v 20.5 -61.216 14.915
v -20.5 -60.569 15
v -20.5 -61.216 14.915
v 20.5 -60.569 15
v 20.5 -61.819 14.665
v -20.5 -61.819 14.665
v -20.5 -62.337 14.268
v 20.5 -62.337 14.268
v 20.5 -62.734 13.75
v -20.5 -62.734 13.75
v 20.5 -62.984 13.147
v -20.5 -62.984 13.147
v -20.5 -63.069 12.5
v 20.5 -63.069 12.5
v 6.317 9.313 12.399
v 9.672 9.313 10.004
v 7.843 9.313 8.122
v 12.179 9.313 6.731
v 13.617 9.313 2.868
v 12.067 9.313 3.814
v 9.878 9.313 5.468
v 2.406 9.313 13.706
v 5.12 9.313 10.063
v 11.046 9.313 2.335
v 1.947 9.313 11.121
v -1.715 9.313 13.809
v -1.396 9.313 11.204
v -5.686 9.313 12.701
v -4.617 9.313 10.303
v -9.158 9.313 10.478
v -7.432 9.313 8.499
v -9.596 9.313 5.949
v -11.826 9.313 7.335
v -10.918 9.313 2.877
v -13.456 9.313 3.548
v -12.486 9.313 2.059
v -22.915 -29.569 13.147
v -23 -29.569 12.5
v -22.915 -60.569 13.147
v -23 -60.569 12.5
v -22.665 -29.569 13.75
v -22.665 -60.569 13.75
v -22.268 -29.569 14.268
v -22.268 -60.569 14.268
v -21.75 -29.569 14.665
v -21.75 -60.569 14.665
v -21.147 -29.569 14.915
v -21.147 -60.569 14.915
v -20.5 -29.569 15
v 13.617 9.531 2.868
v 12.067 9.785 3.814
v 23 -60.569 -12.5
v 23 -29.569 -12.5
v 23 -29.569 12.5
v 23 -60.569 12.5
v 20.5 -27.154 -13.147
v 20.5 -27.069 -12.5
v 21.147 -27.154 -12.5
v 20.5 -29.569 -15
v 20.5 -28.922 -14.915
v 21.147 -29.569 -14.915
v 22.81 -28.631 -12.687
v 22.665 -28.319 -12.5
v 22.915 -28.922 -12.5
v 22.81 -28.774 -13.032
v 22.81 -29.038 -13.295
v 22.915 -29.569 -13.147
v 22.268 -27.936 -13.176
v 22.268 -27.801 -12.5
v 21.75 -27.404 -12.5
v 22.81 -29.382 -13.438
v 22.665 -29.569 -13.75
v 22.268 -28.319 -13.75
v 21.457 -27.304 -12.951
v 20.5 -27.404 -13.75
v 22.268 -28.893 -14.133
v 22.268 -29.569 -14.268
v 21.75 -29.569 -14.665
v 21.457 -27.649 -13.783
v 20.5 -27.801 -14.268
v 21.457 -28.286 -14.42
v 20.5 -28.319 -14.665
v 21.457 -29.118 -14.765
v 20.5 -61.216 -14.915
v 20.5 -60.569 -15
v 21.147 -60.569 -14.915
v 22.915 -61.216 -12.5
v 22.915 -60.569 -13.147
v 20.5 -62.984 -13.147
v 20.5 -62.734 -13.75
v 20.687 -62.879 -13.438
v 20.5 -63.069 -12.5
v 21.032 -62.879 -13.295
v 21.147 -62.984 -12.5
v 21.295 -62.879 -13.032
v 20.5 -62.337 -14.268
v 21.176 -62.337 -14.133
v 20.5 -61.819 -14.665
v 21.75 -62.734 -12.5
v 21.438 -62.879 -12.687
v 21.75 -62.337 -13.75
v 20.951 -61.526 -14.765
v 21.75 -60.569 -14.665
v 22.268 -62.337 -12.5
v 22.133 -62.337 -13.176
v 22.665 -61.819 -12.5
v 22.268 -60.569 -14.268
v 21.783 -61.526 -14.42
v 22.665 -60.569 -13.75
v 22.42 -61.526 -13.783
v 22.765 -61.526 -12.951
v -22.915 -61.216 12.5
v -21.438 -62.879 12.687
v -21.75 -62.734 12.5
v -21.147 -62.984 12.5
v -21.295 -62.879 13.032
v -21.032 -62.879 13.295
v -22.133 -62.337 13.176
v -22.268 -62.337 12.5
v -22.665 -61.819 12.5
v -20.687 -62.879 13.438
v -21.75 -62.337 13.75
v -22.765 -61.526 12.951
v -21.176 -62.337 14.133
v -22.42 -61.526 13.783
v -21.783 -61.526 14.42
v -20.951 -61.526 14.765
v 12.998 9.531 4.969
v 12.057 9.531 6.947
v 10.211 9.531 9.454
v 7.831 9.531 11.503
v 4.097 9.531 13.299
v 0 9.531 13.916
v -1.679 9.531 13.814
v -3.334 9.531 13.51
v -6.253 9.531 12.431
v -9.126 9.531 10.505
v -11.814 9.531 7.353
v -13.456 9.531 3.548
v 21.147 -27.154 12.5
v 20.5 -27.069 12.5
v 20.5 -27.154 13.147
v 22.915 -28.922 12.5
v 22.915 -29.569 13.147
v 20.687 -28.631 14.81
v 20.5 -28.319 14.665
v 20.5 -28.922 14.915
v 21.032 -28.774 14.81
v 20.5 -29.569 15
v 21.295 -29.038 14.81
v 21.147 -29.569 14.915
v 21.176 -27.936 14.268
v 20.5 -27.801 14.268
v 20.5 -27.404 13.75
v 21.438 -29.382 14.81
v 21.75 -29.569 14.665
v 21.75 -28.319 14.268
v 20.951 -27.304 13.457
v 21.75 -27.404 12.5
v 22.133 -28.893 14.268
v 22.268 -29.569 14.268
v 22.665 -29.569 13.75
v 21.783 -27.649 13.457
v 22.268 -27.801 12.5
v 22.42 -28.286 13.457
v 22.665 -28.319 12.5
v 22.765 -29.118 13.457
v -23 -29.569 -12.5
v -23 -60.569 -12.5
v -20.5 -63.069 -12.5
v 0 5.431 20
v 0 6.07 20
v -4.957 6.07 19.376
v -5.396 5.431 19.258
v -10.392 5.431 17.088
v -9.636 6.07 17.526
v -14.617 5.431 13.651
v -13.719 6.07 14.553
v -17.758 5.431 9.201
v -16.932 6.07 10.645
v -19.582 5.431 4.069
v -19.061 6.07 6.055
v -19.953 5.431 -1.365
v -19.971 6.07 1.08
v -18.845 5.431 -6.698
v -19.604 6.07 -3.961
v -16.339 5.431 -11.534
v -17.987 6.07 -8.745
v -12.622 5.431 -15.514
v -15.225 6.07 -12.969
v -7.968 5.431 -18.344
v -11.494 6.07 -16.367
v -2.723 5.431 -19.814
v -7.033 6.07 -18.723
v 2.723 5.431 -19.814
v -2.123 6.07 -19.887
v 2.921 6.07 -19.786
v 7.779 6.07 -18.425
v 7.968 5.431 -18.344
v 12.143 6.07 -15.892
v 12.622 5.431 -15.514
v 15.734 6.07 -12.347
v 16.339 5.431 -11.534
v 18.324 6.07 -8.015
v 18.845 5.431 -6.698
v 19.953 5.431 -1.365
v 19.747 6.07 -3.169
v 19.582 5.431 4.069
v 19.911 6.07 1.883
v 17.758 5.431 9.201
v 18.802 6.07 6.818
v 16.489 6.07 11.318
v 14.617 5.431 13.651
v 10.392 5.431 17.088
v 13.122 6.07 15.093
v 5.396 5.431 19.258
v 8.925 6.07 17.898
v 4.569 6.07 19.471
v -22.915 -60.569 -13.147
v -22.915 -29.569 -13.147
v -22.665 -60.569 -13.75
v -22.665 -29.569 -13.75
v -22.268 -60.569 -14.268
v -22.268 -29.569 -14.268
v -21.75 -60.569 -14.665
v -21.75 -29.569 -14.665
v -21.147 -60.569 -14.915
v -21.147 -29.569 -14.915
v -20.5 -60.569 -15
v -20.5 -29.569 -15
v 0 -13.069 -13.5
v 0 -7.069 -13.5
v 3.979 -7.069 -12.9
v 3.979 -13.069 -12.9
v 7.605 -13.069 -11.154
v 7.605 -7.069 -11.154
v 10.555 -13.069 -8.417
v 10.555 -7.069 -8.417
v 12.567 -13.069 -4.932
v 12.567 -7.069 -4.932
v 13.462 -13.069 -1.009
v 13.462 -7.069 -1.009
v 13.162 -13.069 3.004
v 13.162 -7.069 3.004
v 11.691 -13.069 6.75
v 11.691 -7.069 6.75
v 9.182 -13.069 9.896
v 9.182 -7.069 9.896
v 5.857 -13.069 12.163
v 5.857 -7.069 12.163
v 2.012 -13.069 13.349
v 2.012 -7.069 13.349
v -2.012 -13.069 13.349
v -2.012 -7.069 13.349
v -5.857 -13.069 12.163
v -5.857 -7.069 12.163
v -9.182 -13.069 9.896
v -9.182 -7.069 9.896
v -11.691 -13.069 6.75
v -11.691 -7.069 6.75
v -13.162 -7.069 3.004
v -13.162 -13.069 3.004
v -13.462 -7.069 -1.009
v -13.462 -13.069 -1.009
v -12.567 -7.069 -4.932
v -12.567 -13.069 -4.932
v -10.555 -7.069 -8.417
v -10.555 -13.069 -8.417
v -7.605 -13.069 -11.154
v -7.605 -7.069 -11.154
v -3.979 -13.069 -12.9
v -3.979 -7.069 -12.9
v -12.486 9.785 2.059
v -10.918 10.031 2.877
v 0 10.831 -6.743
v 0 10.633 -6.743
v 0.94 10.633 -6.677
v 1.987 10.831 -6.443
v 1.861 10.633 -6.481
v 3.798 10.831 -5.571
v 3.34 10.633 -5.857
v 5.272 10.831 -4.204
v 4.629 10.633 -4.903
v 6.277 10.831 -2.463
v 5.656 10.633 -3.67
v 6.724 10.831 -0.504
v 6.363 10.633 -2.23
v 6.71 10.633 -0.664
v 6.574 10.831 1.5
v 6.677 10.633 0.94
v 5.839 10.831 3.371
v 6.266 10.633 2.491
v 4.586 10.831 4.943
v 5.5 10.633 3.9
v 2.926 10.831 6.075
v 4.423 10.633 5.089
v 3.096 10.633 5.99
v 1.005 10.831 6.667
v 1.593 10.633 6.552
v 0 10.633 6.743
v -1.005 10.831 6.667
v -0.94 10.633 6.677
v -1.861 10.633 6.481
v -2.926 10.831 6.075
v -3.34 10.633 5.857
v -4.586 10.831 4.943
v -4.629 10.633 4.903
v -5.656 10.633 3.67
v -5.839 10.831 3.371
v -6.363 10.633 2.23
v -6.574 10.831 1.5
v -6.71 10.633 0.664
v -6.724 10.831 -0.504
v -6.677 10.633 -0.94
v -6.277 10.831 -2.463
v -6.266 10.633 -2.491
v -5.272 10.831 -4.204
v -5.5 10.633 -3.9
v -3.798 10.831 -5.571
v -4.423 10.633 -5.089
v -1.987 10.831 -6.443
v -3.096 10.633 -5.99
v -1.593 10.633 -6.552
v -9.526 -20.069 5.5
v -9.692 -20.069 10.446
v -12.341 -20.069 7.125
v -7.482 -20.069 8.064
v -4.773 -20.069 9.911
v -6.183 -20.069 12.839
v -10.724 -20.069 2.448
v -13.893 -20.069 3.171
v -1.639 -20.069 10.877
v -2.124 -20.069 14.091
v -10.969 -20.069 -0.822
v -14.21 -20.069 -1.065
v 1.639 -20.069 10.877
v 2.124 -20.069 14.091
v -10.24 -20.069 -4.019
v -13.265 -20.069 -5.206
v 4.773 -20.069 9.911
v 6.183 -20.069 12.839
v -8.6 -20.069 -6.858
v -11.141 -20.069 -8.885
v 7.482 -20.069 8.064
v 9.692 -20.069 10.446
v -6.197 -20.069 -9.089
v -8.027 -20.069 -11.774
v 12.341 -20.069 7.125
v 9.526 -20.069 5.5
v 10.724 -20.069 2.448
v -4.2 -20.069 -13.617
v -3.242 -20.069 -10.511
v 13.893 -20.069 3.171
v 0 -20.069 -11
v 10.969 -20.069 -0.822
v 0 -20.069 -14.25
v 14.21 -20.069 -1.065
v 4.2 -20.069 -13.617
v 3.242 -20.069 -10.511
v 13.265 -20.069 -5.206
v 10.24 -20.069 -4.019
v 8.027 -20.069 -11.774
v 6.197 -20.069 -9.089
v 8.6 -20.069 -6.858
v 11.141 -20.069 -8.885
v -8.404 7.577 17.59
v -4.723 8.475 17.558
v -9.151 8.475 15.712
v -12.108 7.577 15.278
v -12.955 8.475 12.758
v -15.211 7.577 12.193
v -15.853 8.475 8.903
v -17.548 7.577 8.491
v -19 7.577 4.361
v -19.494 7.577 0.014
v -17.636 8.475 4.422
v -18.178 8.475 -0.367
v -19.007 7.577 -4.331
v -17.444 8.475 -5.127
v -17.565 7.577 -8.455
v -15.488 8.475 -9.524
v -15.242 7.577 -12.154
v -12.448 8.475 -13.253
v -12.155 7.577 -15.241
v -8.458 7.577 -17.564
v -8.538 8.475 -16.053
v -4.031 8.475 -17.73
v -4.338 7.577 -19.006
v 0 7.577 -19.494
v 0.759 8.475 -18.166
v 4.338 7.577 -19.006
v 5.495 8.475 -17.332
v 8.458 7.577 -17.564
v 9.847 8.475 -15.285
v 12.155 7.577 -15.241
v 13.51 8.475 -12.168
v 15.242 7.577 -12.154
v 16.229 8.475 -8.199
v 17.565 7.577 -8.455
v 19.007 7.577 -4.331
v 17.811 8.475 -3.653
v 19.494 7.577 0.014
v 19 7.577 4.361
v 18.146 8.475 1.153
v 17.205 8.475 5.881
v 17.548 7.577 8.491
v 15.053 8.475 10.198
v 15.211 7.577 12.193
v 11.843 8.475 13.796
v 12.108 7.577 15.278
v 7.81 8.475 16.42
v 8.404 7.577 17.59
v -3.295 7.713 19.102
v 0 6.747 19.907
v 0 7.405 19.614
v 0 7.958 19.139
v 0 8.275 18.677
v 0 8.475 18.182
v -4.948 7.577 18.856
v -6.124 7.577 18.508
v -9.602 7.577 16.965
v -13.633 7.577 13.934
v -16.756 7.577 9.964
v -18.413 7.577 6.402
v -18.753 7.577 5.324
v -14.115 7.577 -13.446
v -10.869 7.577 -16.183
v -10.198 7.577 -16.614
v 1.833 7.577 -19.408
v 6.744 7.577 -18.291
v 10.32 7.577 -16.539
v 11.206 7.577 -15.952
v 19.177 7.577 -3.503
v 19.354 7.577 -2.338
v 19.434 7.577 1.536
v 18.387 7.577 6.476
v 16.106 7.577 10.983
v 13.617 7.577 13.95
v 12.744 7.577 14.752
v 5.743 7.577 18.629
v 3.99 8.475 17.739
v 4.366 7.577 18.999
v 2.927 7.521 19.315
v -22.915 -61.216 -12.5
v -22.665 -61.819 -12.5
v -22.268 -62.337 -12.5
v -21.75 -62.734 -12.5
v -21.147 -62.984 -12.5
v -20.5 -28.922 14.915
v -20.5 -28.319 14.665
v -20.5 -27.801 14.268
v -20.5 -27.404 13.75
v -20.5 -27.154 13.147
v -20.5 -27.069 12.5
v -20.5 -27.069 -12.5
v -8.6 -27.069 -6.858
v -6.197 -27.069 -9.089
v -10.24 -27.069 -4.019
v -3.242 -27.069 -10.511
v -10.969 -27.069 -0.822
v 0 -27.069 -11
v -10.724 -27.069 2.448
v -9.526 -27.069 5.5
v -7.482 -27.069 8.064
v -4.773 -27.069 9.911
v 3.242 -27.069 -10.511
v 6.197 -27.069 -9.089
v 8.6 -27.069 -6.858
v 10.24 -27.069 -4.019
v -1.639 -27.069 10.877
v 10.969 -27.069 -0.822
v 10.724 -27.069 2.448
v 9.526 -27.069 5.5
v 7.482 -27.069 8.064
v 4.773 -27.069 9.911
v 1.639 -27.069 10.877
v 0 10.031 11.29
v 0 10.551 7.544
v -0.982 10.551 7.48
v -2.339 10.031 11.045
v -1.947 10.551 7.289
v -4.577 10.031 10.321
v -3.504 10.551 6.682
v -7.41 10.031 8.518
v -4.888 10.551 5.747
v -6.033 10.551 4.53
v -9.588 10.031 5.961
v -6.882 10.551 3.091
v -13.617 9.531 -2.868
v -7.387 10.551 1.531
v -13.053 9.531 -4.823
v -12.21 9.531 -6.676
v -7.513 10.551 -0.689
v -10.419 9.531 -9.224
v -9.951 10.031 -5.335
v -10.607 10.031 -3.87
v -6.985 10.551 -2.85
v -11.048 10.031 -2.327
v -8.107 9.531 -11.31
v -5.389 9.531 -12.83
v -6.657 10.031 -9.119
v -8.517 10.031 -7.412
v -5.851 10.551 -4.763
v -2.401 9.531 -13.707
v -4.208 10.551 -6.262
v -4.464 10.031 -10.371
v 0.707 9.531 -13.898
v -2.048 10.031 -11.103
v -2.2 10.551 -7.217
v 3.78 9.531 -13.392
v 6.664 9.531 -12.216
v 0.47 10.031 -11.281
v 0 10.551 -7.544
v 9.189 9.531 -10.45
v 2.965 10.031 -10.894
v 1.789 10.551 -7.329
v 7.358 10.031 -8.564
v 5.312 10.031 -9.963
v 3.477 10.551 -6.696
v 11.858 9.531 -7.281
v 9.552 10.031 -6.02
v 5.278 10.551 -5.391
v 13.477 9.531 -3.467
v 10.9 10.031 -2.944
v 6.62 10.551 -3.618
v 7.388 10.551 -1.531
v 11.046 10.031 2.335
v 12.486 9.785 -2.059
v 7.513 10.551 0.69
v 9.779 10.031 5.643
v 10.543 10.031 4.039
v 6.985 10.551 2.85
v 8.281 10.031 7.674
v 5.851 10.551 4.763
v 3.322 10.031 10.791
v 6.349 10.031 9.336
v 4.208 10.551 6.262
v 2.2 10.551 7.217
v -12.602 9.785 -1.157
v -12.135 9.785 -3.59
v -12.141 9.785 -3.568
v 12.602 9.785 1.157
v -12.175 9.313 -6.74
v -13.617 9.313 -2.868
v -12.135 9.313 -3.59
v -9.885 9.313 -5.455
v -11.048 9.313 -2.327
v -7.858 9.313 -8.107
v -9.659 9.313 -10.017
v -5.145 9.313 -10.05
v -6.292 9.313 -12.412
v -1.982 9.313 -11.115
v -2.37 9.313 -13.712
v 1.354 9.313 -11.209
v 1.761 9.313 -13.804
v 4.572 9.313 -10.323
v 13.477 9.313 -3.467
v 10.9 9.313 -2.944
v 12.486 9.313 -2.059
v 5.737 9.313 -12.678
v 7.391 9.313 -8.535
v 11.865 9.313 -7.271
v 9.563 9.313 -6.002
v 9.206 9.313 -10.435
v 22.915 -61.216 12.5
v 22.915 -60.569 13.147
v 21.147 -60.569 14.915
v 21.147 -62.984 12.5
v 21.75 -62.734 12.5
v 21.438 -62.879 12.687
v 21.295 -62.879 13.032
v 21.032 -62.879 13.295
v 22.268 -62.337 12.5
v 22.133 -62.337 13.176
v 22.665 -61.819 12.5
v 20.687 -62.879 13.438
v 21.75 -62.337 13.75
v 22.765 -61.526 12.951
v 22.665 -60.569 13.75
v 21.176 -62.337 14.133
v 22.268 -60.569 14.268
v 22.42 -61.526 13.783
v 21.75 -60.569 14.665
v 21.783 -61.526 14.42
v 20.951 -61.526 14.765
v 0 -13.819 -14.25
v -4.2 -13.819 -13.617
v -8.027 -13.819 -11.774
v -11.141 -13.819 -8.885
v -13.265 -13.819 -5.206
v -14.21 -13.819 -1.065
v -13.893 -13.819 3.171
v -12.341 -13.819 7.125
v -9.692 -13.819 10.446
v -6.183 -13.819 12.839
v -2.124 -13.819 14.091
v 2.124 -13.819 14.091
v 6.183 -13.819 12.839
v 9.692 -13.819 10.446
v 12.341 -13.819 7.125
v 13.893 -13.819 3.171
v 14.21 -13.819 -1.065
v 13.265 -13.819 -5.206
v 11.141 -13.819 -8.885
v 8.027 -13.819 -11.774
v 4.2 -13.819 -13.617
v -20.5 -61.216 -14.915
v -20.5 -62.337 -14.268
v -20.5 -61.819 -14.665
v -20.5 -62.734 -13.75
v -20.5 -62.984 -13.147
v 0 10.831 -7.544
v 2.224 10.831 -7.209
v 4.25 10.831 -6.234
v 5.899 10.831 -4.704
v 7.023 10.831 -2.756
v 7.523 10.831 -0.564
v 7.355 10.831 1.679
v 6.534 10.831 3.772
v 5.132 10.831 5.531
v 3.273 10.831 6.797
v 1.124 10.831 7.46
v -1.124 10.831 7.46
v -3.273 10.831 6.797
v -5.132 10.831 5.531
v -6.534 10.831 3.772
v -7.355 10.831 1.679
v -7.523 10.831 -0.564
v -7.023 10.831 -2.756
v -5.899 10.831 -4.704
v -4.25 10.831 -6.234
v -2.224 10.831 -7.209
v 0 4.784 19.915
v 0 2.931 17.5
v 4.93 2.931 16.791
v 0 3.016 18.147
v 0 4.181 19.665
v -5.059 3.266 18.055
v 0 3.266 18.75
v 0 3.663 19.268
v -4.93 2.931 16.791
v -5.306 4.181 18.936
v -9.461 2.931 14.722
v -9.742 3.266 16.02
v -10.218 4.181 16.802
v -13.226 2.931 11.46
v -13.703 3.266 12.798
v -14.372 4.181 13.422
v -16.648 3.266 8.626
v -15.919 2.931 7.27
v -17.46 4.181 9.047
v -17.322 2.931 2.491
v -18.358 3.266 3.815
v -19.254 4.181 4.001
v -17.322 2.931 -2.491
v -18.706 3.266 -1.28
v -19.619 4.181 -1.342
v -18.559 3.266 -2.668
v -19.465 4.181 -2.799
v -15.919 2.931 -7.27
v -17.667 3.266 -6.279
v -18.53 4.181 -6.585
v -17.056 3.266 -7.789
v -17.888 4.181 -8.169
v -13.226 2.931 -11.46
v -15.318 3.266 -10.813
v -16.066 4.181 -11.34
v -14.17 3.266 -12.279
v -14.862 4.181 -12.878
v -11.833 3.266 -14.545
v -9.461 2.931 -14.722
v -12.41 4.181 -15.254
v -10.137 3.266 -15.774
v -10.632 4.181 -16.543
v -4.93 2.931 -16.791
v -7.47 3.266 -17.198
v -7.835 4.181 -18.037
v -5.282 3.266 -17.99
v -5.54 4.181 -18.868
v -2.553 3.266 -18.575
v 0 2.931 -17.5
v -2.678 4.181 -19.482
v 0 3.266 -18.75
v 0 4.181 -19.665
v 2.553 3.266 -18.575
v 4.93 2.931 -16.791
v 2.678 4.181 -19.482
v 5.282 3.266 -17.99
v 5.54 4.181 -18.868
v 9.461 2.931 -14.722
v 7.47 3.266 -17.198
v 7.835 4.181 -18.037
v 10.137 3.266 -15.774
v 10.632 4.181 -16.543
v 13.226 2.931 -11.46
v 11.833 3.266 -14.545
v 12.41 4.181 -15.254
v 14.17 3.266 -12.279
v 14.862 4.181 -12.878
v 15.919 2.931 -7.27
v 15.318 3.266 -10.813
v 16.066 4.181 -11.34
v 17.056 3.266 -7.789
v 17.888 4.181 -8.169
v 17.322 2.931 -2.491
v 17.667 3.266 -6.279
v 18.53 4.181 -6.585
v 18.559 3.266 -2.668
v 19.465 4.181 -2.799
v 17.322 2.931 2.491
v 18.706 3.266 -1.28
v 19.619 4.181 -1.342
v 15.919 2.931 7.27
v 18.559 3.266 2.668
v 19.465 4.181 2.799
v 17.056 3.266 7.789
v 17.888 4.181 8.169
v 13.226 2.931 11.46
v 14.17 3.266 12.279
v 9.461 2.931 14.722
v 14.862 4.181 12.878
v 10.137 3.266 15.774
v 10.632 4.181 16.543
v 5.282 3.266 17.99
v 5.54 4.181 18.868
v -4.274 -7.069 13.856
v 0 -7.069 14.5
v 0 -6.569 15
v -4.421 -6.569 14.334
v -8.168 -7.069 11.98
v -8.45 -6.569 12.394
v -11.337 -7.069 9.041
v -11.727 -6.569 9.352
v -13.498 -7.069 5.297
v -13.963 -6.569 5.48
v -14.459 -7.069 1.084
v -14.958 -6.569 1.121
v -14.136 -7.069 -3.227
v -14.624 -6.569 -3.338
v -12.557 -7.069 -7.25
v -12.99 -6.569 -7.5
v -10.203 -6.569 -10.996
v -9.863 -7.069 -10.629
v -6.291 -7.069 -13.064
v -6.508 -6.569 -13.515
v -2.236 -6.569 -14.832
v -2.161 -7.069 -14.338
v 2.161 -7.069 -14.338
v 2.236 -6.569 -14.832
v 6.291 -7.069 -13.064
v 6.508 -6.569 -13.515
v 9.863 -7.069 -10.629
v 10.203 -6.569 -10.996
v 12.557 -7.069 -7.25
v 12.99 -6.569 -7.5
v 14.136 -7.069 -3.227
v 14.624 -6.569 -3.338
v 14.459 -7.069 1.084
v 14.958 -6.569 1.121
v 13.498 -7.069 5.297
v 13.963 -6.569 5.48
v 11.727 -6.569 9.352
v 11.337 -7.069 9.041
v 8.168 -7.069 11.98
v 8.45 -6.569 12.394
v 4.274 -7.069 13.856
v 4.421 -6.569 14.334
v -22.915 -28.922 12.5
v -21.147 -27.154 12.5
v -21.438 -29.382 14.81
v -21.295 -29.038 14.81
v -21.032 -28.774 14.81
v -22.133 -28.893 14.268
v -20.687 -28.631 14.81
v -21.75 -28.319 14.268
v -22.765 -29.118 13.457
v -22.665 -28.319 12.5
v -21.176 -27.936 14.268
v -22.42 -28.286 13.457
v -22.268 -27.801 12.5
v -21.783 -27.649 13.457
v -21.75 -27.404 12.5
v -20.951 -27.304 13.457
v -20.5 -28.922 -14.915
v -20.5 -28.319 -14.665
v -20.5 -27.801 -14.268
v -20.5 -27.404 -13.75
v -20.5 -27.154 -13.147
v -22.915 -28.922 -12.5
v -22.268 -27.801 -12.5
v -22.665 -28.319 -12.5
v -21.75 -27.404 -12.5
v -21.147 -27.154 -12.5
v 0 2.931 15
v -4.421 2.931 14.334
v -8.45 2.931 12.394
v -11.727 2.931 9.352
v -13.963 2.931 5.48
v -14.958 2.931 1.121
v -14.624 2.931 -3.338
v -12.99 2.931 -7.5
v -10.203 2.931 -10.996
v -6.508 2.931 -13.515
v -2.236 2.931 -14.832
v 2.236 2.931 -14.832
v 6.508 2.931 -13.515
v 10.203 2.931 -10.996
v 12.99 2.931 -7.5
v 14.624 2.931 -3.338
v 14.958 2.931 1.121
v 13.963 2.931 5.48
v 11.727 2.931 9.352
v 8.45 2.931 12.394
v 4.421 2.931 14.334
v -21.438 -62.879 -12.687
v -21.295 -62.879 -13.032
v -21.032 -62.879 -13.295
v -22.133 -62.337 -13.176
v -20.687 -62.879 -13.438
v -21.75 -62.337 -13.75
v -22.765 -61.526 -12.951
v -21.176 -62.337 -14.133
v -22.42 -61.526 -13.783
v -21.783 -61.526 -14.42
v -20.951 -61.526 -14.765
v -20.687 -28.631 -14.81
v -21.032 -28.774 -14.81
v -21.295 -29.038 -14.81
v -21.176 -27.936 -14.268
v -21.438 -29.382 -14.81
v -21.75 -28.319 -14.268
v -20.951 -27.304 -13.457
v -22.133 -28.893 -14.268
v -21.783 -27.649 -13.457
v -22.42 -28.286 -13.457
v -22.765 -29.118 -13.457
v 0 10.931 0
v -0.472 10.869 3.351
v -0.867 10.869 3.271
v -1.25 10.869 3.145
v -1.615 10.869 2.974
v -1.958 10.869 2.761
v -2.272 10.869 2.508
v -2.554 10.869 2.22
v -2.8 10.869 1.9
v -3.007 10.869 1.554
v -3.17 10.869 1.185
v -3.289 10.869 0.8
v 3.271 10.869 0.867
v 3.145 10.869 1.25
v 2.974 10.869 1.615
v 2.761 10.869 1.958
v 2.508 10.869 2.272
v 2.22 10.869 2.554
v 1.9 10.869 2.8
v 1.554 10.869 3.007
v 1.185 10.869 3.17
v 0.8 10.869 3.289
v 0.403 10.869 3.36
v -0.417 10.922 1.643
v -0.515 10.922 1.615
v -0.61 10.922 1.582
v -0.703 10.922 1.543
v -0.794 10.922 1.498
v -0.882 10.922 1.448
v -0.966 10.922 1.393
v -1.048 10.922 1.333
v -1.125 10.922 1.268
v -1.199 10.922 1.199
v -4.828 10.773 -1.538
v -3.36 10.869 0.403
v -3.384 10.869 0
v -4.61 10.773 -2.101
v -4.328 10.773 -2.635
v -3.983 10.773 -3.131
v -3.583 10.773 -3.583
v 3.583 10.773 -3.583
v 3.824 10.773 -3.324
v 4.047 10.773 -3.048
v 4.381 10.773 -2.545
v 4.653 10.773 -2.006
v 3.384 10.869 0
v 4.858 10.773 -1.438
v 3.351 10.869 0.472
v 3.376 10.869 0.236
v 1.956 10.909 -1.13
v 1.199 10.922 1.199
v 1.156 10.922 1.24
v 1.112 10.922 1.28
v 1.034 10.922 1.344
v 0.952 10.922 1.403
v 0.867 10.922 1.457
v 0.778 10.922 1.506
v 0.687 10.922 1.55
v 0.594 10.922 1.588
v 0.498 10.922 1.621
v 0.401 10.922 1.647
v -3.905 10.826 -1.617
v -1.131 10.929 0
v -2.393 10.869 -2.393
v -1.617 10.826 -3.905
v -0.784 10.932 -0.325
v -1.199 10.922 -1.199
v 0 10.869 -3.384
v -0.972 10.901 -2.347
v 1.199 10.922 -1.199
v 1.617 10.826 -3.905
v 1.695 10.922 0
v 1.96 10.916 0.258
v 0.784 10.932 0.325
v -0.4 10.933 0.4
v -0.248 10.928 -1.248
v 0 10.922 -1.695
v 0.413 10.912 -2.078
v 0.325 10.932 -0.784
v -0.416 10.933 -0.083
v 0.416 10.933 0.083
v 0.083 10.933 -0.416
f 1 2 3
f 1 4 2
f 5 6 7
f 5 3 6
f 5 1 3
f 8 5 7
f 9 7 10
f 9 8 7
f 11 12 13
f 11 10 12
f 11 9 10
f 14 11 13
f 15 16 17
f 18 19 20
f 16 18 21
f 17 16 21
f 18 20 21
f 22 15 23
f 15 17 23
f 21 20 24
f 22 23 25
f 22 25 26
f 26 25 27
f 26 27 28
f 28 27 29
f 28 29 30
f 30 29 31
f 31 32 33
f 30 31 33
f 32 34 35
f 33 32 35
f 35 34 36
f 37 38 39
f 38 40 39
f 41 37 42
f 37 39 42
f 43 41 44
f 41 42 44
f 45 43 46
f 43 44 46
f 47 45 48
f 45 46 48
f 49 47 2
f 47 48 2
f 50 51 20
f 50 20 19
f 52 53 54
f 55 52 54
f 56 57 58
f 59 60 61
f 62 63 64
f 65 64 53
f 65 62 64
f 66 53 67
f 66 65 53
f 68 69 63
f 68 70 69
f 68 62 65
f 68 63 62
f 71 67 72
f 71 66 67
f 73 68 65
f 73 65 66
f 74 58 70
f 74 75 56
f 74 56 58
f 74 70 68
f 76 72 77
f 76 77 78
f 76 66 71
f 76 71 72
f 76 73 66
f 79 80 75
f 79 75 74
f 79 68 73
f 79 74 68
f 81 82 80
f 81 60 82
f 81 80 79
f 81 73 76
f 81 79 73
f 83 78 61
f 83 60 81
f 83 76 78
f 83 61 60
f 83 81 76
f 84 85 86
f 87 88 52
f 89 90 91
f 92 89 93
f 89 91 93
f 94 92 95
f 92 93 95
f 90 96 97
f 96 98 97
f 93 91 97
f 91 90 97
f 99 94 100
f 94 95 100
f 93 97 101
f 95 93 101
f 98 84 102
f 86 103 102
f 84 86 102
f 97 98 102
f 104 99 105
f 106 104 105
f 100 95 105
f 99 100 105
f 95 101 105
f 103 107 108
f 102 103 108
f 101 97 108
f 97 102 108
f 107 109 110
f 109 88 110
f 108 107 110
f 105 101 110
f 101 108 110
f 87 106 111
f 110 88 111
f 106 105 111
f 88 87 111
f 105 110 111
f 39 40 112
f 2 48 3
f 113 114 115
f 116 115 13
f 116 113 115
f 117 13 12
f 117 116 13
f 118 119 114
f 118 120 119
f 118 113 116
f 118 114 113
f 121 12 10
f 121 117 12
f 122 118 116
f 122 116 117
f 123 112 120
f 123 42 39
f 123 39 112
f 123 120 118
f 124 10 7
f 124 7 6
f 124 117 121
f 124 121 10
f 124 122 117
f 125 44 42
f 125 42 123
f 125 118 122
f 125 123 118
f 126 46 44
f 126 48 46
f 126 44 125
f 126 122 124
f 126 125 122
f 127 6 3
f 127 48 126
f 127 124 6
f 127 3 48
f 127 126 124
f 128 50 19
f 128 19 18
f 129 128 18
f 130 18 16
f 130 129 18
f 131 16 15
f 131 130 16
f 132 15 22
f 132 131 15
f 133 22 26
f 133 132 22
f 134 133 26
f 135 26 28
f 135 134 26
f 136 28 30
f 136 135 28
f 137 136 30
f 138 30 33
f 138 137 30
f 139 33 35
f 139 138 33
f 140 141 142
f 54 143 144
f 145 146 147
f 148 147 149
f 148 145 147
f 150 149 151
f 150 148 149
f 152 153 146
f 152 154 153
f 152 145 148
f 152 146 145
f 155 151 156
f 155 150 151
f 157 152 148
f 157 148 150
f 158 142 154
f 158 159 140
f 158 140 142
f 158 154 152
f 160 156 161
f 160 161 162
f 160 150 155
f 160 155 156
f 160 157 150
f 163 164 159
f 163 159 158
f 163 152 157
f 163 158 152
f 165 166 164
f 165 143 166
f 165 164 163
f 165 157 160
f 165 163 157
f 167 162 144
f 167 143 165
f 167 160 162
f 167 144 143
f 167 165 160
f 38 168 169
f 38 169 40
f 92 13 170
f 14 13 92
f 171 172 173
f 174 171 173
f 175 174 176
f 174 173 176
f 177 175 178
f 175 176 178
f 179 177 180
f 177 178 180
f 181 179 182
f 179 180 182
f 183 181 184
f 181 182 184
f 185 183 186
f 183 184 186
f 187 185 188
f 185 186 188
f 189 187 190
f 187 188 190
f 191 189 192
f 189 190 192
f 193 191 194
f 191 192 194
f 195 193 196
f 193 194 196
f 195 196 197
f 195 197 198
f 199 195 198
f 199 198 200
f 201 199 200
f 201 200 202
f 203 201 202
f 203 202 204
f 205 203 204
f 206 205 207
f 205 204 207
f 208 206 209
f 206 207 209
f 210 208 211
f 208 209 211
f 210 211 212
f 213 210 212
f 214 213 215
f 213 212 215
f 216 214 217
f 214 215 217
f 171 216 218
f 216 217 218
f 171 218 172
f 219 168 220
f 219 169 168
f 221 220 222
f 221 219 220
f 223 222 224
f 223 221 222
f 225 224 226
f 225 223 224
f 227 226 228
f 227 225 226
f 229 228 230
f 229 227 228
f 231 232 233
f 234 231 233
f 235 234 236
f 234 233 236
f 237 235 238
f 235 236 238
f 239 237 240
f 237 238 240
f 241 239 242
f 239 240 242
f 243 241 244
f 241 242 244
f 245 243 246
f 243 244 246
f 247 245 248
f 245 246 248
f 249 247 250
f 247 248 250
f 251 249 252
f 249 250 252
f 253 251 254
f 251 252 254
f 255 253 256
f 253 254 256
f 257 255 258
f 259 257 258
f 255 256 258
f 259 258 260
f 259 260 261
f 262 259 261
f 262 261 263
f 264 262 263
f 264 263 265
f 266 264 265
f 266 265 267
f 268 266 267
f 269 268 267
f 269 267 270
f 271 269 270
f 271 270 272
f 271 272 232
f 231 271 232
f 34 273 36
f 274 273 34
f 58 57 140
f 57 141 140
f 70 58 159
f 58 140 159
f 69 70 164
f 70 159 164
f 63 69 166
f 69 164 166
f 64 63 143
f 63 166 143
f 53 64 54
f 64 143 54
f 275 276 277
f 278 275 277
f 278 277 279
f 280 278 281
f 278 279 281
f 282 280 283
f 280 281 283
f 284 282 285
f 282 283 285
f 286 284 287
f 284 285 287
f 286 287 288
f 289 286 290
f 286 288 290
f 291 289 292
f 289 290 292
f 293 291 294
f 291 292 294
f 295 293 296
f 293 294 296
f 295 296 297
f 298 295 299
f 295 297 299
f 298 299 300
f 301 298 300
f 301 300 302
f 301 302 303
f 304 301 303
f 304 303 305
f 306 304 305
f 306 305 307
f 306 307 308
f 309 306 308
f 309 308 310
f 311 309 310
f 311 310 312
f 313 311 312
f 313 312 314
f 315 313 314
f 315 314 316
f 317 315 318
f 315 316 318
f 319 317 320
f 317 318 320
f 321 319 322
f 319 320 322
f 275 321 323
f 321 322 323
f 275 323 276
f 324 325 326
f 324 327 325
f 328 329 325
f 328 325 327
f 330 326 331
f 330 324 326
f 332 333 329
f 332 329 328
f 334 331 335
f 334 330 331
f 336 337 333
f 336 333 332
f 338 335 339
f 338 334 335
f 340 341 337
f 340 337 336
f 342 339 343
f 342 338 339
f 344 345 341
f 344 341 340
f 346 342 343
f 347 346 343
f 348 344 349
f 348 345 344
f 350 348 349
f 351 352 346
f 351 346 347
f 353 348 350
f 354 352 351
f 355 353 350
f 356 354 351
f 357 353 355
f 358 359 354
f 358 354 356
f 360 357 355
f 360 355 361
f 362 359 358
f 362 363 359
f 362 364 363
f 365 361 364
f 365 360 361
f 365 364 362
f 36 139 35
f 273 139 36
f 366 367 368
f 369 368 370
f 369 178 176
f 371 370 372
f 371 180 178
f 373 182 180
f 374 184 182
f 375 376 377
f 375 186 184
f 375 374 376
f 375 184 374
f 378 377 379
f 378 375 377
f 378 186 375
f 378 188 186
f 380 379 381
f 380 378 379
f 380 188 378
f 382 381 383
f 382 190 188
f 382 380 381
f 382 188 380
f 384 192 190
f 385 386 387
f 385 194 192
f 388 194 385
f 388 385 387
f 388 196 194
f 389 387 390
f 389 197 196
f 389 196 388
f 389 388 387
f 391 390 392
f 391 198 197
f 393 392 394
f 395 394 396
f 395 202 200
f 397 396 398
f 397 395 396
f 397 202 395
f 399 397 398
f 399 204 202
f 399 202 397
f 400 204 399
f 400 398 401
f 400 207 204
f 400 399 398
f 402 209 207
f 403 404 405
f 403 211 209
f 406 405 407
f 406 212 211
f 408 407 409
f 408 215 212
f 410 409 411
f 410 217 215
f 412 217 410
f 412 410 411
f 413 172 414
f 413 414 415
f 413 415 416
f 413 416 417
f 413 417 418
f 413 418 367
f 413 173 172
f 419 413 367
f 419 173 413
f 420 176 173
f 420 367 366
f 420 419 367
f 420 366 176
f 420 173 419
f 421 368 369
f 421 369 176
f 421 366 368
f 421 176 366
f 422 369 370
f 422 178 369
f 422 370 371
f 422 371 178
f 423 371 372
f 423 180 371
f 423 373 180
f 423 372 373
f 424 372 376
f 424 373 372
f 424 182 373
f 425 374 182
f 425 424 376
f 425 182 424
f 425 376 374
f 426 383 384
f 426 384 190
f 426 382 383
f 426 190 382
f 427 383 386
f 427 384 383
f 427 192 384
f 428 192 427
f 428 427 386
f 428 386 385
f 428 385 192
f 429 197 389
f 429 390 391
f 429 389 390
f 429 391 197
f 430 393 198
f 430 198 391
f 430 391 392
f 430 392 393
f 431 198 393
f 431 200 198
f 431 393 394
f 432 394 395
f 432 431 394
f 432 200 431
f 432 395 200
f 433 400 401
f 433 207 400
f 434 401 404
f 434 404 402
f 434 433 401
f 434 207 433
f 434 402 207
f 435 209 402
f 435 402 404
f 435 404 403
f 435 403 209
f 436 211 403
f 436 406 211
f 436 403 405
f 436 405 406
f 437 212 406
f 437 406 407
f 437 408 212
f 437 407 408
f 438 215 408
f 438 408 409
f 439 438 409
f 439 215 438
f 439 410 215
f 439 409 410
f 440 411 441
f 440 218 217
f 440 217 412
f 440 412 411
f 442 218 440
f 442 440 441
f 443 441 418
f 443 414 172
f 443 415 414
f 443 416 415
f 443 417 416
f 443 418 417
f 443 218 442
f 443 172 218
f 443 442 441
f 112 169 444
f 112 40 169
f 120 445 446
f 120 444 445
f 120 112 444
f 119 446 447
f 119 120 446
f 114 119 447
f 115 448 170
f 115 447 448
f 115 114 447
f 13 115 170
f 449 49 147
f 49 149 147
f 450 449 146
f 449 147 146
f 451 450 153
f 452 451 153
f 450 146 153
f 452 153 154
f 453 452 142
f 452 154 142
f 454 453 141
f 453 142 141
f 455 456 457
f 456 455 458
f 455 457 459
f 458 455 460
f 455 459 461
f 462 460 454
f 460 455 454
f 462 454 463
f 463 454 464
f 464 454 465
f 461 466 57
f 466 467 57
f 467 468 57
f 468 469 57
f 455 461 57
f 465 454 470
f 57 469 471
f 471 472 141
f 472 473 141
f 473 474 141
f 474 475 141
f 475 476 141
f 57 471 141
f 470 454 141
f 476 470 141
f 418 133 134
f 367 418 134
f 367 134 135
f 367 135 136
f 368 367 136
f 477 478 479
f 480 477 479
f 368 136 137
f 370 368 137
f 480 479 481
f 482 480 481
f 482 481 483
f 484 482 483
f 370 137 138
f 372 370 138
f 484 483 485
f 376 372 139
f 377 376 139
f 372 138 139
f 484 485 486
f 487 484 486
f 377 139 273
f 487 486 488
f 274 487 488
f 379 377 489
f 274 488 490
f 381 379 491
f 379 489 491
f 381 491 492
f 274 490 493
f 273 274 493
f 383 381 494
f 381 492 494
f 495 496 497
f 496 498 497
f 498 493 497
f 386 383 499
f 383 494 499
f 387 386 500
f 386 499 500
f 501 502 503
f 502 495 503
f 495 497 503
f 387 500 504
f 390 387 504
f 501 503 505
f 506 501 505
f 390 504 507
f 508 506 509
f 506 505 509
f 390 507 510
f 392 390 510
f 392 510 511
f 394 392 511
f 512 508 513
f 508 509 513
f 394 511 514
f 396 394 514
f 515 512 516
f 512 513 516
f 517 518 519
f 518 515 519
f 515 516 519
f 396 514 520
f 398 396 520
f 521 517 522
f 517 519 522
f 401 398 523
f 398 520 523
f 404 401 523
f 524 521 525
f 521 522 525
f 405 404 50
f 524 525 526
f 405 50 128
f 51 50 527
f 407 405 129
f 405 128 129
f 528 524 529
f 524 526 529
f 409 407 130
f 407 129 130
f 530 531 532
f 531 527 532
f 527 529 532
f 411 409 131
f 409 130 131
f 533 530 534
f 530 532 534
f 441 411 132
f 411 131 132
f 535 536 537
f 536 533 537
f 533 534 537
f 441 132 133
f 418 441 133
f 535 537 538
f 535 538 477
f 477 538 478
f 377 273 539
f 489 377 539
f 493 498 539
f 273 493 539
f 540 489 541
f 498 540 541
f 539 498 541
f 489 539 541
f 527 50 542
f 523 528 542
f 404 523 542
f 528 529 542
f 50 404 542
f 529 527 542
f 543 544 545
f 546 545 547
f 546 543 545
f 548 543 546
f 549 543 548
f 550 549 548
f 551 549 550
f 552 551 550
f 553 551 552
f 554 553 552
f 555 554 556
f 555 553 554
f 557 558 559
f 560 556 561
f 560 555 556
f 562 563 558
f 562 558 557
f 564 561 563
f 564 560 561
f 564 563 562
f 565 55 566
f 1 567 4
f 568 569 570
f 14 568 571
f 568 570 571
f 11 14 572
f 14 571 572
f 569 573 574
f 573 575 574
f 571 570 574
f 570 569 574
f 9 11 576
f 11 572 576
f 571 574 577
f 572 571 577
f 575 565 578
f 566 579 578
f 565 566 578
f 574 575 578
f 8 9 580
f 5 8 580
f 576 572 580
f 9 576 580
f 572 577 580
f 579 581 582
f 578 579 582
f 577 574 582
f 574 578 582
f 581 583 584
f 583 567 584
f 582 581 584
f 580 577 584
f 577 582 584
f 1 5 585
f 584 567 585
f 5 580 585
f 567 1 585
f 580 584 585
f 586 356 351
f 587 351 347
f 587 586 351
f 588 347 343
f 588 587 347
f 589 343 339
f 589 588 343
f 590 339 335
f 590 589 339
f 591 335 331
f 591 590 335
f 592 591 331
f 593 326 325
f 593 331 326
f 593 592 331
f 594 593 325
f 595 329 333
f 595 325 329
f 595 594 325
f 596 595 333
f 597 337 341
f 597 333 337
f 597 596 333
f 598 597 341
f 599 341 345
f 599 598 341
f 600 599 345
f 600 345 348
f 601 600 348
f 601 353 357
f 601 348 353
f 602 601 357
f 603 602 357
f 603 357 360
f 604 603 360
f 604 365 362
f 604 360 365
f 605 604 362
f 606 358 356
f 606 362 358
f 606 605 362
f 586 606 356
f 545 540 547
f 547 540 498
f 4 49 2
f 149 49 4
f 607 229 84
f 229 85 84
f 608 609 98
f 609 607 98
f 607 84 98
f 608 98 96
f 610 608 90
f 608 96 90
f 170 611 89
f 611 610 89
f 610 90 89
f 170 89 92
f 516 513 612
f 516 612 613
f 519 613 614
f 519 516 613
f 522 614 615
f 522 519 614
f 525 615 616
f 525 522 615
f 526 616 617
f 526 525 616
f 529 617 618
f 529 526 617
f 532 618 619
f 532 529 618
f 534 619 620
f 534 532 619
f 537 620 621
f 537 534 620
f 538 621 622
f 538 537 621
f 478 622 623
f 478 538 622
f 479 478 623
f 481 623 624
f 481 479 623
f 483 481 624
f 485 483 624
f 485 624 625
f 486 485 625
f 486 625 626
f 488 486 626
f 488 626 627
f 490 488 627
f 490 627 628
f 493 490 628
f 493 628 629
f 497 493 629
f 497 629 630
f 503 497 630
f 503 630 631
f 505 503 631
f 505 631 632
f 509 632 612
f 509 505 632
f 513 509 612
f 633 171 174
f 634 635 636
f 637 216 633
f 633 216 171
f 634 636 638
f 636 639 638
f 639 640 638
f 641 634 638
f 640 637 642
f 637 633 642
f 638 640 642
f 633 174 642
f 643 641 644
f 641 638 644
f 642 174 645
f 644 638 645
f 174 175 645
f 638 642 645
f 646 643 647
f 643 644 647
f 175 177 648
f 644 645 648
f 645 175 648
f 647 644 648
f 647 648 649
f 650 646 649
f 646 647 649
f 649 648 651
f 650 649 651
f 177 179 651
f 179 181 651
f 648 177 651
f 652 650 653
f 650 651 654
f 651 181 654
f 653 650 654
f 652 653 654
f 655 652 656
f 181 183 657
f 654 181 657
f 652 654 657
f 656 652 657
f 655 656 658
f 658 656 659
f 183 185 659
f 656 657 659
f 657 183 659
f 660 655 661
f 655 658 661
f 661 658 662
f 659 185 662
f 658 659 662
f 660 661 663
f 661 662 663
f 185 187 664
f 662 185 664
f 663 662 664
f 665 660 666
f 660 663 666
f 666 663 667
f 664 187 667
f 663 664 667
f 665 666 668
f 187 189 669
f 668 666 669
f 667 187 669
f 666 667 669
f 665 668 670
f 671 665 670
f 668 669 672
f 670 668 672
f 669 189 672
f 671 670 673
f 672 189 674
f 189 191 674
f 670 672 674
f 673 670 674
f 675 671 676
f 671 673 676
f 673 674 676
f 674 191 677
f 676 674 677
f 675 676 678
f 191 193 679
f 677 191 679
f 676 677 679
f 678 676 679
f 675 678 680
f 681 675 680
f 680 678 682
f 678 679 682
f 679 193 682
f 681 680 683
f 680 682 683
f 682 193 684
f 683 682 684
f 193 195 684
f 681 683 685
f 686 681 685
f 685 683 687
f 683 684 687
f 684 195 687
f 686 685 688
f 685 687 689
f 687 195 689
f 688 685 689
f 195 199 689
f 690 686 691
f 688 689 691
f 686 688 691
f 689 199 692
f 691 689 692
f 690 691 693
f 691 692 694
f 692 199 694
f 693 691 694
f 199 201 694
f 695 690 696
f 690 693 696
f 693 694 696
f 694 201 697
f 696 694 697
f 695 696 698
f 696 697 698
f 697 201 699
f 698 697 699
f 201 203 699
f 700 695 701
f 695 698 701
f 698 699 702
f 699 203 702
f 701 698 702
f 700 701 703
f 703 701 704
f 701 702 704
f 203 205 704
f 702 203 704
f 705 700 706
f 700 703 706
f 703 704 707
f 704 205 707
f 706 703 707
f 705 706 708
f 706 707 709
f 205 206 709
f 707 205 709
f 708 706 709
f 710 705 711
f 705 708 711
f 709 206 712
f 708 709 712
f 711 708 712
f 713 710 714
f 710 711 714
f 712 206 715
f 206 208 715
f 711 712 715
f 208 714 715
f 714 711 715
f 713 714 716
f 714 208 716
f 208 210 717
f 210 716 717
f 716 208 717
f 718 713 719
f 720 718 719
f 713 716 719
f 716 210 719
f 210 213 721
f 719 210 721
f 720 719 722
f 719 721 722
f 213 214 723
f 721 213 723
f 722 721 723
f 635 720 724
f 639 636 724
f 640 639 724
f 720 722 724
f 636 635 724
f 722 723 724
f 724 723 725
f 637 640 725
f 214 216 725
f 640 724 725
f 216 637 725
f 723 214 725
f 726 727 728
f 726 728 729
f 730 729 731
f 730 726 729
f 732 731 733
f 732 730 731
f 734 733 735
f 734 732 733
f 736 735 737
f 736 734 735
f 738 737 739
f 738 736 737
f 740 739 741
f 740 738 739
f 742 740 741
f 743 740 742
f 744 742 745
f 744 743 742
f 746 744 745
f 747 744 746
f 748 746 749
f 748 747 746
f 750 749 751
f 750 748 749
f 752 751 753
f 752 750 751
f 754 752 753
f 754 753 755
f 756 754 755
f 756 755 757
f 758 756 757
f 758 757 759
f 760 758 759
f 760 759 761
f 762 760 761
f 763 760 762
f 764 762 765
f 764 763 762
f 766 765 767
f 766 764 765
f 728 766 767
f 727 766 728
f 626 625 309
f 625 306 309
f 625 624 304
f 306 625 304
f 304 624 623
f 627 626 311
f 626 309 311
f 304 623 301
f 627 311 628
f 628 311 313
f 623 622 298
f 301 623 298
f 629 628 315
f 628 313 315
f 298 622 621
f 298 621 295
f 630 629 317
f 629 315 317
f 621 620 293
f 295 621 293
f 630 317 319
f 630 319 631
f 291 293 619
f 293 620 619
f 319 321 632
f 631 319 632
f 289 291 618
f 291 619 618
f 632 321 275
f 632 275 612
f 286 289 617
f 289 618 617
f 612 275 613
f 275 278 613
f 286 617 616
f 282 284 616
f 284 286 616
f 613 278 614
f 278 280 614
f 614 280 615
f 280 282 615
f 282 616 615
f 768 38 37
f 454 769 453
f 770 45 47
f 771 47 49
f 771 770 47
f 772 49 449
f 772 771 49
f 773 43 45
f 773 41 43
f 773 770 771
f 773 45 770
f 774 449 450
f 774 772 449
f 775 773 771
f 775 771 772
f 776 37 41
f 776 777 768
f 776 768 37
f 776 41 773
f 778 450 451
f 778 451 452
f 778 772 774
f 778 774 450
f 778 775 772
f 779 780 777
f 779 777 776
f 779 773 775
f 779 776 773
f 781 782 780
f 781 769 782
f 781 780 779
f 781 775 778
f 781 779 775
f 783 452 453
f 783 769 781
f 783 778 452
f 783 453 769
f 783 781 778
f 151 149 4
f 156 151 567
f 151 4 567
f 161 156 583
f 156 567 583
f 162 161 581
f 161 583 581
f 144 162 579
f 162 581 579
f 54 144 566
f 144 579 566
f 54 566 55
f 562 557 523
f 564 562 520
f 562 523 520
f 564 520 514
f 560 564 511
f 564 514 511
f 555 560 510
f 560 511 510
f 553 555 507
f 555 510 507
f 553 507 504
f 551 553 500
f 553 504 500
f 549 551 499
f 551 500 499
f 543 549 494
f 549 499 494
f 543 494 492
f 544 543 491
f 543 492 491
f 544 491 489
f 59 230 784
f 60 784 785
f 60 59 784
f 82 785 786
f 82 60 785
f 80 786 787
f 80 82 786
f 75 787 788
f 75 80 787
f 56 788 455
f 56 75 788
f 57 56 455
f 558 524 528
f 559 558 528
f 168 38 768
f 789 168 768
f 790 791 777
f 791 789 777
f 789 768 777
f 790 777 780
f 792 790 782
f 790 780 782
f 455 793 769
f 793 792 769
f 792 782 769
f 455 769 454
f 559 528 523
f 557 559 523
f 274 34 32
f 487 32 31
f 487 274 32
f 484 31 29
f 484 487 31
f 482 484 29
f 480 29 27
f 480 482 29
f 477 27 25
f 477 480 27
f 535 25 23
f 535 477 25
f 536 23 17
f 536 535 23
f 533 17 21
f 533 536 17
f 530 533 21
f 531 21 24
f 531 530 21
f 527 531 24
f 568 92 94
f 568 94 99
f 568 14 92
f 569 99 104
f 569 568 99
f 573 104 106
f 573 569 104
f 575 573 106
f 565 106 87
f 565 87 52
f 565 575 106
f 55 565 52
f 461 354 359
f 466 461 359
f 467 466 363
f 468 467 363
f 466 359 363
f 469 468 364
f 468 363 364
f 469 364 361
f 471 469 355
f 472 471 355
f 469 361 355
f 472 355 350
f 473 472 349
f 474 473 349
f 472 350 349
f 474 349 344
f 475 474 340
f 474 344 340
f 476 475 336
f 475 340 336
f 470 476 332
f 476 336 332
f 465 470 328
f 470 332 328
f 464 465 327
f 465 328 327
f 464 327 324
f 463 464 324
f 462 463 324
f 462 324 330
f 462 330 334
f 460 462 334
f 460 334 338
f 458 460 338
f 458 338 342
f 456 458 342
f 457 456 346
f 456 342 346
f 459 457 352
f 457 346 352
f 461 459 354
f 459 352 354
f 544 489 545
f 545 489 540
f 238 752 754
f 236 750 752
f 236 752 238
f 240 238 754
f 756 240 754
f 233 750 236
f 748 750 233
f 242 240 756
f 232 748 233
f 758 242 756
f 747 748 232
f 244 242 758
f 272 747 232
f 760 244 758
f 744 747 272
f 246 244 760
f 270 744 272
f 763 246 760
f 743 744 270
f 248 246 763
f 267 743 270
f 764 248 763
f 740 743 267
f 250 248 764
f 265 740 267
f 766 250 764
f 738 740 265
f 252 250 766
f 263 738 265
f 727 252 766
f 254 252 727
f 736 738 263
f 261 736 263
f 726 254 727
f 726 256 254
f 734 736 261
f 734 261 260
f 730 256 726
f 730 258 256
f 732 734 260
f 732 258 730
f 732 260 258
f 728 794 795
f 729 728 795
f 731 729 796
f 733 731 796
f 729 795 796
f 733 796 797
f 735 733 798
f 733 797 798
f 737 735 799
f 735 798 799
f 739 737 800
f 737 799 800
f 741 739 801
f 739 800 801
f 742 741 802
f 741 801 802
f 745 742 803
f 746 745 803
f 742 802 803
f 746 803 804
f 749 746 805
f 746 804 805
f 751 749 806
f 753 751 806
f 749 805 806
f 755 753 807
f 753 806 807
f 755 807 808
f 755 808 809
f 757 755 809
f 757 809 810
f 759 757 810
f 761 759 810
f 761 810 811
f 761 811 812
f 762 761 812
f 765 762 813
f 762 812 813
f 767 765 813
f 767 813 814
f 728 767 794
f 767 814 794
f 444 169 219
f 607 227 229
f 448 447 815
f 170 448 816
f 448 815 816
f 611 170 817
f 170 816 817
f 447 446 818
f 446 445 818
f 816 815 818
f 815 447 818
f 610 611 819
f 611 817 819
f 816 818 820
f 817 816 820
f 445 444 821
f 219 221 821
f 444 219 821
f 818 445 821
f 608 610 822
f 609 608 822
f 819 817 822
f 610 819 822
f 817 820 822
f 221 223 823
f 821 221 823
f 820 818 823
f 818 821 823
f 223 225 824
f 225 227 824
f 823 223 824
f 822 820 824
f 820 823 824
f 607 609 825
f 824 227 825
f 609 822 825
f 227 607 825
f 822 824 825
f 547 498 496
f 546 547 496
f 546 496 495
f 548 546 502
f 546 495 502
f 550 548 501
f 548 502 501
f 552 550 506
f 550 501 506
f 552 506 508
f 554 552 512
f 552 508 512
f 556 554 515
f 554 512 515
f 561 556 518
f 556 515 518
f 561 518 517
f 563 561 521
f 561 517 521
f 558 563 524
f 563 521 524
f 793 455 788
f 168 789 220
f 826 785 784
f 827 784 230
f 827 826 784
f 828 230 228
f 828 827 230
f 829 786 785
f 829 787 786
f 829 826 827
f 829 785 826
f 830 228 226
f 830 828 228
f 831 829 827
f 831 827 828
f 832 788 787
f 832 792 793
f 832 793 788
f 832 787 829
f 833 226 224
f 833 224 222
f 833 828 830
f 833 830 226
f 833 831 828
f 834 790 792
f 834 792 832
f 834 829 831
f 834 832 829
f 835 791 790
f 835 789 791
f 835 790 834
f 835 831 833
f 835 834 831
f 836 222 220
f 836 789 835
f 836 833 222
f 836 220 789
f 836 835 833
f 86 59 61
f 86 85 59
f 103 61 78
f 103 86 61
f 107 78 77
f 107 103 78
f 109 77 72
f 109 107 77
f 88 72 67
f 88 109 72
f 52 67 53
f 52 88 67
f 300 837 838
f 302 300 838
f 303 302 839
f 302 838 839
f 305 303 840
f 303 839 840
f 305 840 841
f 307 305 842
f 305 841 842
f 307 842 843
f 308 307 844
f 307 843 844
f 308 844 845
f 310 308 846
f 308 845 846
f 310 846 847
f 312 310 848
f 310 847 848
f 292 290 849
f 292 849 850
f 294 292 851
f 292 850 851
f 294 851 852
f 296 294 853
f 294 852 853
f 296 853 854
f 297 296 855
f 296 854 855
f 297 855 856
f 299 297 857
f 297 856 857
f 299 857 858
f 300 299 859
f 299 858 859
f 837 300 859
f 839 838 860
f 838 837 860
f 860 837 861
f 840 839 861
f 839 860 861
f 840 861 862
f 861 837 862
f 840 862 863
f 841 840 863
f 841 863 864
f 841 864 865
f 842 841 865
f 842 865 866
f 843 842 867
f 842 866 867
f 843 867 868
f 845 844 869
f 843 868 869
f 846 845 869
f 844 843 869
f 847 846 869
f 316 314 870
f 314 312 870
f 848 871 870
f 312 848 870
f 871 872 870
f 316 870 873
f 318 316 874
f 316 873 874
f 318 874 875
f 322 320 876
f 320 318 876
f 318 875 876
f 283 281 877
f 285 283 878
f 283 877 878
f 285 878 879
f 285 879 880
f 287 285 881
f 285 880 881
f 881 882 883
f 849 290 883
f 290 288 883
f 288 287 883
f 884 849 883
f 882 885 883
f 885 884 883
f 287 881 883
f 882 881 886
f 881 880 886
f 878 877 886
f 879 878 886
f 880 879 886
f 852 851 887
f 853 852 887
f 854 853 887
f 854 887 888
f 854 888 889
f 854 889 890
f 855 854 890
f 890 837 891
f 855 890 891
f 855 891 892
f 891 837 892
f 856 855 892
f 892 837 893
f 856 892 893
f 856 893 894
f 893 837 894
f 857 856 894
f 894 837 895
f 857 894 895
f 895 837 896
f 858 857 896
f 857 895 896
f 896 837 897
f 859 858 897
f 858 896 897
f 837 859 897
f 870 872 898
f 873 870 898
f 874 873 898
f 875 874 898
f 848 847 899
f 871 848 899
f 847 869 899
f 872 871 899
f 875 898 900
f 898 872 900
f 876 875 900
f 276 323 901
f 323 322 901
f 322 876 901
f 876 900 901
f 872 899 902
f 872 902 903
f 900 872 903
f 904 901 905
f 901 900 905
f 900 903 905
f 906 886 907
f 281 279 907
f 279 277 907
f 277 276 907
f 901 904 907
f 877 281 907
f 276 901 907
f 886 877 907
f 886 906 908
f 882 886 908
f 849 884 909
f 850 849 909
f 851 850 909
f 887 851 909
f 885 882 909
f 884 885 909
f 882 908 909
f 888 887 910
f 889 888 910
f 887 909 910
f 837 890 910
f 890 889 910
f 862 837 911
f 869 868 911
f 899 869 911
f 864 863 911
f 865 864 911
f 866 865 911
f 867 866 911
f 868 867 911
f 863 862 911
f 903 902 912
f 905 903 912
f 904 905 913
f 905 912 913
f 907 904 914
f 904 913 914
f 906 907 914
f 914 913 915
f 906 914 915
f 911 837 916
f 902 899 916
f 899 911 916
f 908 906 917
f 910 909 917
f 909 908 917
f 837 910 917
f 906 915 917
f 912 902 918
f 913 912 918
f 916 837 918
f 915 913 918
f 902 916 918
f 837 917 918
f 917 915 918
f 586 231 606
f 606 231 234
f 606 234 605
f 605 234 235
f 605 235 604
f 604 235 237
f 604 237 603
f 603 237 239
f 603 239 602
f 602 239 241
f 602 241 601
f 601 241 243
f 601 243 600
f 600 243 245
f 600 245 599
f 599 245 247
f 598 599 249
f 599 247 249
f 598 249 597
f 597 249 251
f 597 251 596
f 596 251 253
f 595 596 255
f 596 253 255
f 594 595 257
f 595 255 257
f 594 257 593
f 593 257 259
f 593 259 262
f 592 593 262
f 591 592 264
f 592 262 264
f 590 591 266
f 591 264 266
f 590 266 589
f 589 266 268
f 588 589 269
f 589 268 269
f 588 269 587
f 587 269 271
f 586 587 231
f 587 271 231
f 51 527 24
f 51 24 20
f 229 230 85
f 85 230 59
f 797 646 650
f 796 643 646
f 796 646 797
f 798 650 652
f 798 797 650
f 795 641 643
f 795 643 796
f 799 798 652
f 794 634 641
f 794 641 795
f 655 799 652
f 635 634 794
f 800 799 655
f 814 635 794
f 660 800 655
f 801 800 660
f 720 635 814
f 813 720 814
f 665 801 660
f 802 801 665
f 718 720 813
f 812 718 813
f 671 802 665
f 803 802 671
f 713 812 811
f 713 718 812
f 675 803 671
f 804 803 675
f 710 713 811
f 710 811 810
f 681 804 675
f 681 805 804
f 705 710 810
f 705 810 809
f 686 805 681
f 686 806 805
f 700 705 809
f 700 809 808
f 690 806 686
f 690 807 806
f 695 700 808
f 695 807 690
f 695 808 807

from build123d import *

# Parameters (mm, degrees)
FILLET_2_R          = 2.5
CUT_EXTRUDE_2_DEPTH = 4.5
SKETCH_6_R          = 7.544495516
SKETCH_6_R_2        = 6.742597779
EXTRUDE_2_DEPTH     = 7.9
SKETCH_7_R          = 15
EXTRUDE_3_DEPTH     = 10
CHAMFER_1_SIZE      = 0.5
SKETCH_8_R          = 13.5
EXTRUDE_4_DEPTH     = 7
SKETCH_9_R          = 14.25
EXTRUDE_5_DEPTH     = 6
CHAMFER_2_SIZE      = 1
SKETCH_10_R         = 11
EXTRUDE_6_DEPTH     = 7
SKETCH_11_W         = 46
SKETCH_11_H         = 30
EXTRUDE_7_DEPTH     = 36
FILLET_3_R          = 2.5


with BuildPart() as part:
    # Эскиз2 → Повернуть1 (revolve)
    with BuildSketch(Plane.XY, mode=Mode.PRIVATE) as revolve_1_sk:
        with BuildLine():
            Line((0, 2.930948498), (20, 2.930948498))
            Line((20, 2.930948498), (20, 7.930948498))
            add(Edge.make_bspline(
                [(20, 7.930948498), (10.236656465, 11.004873072), (0, 10.930948498)],
                knots=[0, 0, 0, 1, 1, 1], degree=2))
            Line((0, 10.930948498), (0, 2.930948498))
        make_face()
    revolve(revolve_1_sk.sketch.rotate(Axis((0, 45.754032666, 0), (0, -1, 0)), 90), axis=Axis((0, 45.754032666, 0), (0, -1, 0)))

    # Скругление2
    fillet_2_edges = [part.edges().sort_by_distance(p)[0] for p in [
        (0, 2.930948498, -20),
        (0, 7.930948498, -20),
    ]]
    fillet(fillet_2_edges, radius=FILLET_2_R)

    # Эскиз5 → Вырез-Вытянуть2 (cut)
    with BuildSketch(Plane(origin=(0, 13.812870775, 0), x_dir=(1, 0, 0), z_dir=(0, 1, 0))):
        with BuildLine():
            Line((-13.616818713, 2.867646528), (-12.134990634, 3.590023912))
            Line((-12.134990634, 3.590023912), (-11.048077198, 2.326680033))
            ThreePointArc((-11.048077198, 2.326680033), (-0.317231994, 11.285956477), (10.899937011, 2.943607126))
            Line((10.899937011, 2.943607126), (12.486323695, 2.058637888))
            Line((12.486323695, 2.058637888), (13.476651449, 3.467133424))
            ThreePointArc((13.476651449, 3.467133424), (-0.307827631, 13.91209512), (-13.616818713, 2.867646528))
        make_face()
        with BuildLine():
            Line((11.046374652, -2.334749837), (12.066615041, -3.813537836))
            Line((12.066615041, -3.813537836), (13.616818713, -2.867646528))
            ThreePointArc((13.616818713, -2.867646528), (0.349599989, -13.911108091), (-13.455587055, -3.548003025))
            Line((-13.455587055, -3.548003025), (-12.486323695, -2.058637888))
            Line((-12.486323695, -2.058637888), (-10.917619437, -2.877331328))
            ThreePointArc((-10.917619437, -2.877331328), (0.278824577, -11.286970657), (11.046374652, -2.334749837))
        make_face()
    extrude(amount=-CUT_EXTRUDE_2_DEPTH, mode=Mode.SUBTRACT)

    # Эскиз6 → Бобышка-Вытянуть2 (add)
    with BuildSketch(Plane.XZ.offset(-2.930948498)):
        with Locations(Location((0, 0, 0), (0, 0, 270))):
            Circle(SKETCH_6_R)
        with Locations(Location((0, 0, 0), (0, 0, 270))):
            Circle(SKETCH_6_R_2, mode=Mode.SUBTRACT)
    extrude(amount=-EXTRUDE_2_DEPTH)

    # Эскиз7 → Бобышка-Вытянуть3 (add)
    with BuildSketch(Plane.XZ.offset(-2.930948498)):
        with Locations(Location((0, 0, 0), (0, 0, 90))):
            Circle(SKETCH_7_R)
    extrude(amount=EXTRUDE_3_DEPTH)

    # Фаска1
    chamfer_1_edges = [part.edges().sort_by_distance(p)[0] for p in [
        (0, -7.069051502, -15),
    ]]
    chamfer(chamfer_1_edges, length=CHAMFER_1_SIZE)

    # Эскиз8 → Бобышка-Вытянуть4 (add)
    with BuildSketch(Plane.XZ.offset(7.069051502)):
        with Locations(Location((0, 0, 0), (0, 0, 270))):
            Circle(SKETCH_8_R)
    extrude(amount=EXTRUDE_4_DEPTH)

    # Эскиз9 → Бобышка-Вытянуть5 (add)
    with BuildSketch(Plane.XZ.offset(14.069051502)):
        with Locations(Location((0, 0, 0), (0, 0, 270))):
            Circle(SKETCH_9_R)
    extrude(amount=EXTRUDE_5_DEPTH)

    # Фаска2
    # the kernel refuses this chamfer: 1 mm, written as the material it adds along each edge
    with BuildSketch(Plane(origin=(0, -14.069051502, 0), x_dir=(0, 0, -1), z_dir=(-1, 0, 0))) as chamfer_2_piece_1_section:
        Polygon((13.5 + CHAMFER_2_SIZE, 0), (13.5, -CHAMFER_2_SIZE), (13.5, 0), align=None)
    chamfer_2_piece_1 = revolve(axis=Axis((0, -14.069051502, 0), (0, -1, 0)), mode=Mode.PRIVATE)
    chamfer_2_piece_1 = chamfer_2_piece_1 & Plane(origin=(0, -13.454886429, 0), x_dir=(0, 0, -1), z_dir=(0, 1, 0)) * Cylinder(14.25, 58, mode=Mode.PRIVATE)
    add(chamfer_2_piece_1)

    # Эскиз10 → Бобышка-Вытянуть6 (add)
    with BuildSketch(Plane.XZ.offset(20.069051502)):
        with Locations(Location((0, 0, 0), (0, 0, 270))):
            Circle(SKETCH_10_R)
    extrude(amount=EXTRUDE_6_DEPTH)

    # Эскиз11 → Бобышка-Вытянуть7 (add)
    with BuildSketch(Plane.XZ.offset(27.069051502)):
        Rectangle(SKETCH_11_W, SKETCH_11_H)
    extrude(amount=EXTRUDE_7_DEPTH)

    # Скругление3
    fillet_3_edges = [part.edges().sort_by_distance(p)[0] for p in [
        (-23, -27.069051502, 0),
        (-23, -45.069051502, 15),
        (0, -27.069051502, -15),
        (-23, -45.069051502, -15),
        (23, -27.069051502, 0),
        (23, -45.069051502, -15),
        (0, -27.069051502, 15),
        (23, -45.069051502, 15),
        (-23, -63.069051502, 0),
        (0, -63.069051502, -15),
        (23, -63.069051502, 0),
        (0, -63.069051502, 15),
    ]]
    fillet(fillet_3_edges, radius=FILLET_3_R)


solid = part.part
